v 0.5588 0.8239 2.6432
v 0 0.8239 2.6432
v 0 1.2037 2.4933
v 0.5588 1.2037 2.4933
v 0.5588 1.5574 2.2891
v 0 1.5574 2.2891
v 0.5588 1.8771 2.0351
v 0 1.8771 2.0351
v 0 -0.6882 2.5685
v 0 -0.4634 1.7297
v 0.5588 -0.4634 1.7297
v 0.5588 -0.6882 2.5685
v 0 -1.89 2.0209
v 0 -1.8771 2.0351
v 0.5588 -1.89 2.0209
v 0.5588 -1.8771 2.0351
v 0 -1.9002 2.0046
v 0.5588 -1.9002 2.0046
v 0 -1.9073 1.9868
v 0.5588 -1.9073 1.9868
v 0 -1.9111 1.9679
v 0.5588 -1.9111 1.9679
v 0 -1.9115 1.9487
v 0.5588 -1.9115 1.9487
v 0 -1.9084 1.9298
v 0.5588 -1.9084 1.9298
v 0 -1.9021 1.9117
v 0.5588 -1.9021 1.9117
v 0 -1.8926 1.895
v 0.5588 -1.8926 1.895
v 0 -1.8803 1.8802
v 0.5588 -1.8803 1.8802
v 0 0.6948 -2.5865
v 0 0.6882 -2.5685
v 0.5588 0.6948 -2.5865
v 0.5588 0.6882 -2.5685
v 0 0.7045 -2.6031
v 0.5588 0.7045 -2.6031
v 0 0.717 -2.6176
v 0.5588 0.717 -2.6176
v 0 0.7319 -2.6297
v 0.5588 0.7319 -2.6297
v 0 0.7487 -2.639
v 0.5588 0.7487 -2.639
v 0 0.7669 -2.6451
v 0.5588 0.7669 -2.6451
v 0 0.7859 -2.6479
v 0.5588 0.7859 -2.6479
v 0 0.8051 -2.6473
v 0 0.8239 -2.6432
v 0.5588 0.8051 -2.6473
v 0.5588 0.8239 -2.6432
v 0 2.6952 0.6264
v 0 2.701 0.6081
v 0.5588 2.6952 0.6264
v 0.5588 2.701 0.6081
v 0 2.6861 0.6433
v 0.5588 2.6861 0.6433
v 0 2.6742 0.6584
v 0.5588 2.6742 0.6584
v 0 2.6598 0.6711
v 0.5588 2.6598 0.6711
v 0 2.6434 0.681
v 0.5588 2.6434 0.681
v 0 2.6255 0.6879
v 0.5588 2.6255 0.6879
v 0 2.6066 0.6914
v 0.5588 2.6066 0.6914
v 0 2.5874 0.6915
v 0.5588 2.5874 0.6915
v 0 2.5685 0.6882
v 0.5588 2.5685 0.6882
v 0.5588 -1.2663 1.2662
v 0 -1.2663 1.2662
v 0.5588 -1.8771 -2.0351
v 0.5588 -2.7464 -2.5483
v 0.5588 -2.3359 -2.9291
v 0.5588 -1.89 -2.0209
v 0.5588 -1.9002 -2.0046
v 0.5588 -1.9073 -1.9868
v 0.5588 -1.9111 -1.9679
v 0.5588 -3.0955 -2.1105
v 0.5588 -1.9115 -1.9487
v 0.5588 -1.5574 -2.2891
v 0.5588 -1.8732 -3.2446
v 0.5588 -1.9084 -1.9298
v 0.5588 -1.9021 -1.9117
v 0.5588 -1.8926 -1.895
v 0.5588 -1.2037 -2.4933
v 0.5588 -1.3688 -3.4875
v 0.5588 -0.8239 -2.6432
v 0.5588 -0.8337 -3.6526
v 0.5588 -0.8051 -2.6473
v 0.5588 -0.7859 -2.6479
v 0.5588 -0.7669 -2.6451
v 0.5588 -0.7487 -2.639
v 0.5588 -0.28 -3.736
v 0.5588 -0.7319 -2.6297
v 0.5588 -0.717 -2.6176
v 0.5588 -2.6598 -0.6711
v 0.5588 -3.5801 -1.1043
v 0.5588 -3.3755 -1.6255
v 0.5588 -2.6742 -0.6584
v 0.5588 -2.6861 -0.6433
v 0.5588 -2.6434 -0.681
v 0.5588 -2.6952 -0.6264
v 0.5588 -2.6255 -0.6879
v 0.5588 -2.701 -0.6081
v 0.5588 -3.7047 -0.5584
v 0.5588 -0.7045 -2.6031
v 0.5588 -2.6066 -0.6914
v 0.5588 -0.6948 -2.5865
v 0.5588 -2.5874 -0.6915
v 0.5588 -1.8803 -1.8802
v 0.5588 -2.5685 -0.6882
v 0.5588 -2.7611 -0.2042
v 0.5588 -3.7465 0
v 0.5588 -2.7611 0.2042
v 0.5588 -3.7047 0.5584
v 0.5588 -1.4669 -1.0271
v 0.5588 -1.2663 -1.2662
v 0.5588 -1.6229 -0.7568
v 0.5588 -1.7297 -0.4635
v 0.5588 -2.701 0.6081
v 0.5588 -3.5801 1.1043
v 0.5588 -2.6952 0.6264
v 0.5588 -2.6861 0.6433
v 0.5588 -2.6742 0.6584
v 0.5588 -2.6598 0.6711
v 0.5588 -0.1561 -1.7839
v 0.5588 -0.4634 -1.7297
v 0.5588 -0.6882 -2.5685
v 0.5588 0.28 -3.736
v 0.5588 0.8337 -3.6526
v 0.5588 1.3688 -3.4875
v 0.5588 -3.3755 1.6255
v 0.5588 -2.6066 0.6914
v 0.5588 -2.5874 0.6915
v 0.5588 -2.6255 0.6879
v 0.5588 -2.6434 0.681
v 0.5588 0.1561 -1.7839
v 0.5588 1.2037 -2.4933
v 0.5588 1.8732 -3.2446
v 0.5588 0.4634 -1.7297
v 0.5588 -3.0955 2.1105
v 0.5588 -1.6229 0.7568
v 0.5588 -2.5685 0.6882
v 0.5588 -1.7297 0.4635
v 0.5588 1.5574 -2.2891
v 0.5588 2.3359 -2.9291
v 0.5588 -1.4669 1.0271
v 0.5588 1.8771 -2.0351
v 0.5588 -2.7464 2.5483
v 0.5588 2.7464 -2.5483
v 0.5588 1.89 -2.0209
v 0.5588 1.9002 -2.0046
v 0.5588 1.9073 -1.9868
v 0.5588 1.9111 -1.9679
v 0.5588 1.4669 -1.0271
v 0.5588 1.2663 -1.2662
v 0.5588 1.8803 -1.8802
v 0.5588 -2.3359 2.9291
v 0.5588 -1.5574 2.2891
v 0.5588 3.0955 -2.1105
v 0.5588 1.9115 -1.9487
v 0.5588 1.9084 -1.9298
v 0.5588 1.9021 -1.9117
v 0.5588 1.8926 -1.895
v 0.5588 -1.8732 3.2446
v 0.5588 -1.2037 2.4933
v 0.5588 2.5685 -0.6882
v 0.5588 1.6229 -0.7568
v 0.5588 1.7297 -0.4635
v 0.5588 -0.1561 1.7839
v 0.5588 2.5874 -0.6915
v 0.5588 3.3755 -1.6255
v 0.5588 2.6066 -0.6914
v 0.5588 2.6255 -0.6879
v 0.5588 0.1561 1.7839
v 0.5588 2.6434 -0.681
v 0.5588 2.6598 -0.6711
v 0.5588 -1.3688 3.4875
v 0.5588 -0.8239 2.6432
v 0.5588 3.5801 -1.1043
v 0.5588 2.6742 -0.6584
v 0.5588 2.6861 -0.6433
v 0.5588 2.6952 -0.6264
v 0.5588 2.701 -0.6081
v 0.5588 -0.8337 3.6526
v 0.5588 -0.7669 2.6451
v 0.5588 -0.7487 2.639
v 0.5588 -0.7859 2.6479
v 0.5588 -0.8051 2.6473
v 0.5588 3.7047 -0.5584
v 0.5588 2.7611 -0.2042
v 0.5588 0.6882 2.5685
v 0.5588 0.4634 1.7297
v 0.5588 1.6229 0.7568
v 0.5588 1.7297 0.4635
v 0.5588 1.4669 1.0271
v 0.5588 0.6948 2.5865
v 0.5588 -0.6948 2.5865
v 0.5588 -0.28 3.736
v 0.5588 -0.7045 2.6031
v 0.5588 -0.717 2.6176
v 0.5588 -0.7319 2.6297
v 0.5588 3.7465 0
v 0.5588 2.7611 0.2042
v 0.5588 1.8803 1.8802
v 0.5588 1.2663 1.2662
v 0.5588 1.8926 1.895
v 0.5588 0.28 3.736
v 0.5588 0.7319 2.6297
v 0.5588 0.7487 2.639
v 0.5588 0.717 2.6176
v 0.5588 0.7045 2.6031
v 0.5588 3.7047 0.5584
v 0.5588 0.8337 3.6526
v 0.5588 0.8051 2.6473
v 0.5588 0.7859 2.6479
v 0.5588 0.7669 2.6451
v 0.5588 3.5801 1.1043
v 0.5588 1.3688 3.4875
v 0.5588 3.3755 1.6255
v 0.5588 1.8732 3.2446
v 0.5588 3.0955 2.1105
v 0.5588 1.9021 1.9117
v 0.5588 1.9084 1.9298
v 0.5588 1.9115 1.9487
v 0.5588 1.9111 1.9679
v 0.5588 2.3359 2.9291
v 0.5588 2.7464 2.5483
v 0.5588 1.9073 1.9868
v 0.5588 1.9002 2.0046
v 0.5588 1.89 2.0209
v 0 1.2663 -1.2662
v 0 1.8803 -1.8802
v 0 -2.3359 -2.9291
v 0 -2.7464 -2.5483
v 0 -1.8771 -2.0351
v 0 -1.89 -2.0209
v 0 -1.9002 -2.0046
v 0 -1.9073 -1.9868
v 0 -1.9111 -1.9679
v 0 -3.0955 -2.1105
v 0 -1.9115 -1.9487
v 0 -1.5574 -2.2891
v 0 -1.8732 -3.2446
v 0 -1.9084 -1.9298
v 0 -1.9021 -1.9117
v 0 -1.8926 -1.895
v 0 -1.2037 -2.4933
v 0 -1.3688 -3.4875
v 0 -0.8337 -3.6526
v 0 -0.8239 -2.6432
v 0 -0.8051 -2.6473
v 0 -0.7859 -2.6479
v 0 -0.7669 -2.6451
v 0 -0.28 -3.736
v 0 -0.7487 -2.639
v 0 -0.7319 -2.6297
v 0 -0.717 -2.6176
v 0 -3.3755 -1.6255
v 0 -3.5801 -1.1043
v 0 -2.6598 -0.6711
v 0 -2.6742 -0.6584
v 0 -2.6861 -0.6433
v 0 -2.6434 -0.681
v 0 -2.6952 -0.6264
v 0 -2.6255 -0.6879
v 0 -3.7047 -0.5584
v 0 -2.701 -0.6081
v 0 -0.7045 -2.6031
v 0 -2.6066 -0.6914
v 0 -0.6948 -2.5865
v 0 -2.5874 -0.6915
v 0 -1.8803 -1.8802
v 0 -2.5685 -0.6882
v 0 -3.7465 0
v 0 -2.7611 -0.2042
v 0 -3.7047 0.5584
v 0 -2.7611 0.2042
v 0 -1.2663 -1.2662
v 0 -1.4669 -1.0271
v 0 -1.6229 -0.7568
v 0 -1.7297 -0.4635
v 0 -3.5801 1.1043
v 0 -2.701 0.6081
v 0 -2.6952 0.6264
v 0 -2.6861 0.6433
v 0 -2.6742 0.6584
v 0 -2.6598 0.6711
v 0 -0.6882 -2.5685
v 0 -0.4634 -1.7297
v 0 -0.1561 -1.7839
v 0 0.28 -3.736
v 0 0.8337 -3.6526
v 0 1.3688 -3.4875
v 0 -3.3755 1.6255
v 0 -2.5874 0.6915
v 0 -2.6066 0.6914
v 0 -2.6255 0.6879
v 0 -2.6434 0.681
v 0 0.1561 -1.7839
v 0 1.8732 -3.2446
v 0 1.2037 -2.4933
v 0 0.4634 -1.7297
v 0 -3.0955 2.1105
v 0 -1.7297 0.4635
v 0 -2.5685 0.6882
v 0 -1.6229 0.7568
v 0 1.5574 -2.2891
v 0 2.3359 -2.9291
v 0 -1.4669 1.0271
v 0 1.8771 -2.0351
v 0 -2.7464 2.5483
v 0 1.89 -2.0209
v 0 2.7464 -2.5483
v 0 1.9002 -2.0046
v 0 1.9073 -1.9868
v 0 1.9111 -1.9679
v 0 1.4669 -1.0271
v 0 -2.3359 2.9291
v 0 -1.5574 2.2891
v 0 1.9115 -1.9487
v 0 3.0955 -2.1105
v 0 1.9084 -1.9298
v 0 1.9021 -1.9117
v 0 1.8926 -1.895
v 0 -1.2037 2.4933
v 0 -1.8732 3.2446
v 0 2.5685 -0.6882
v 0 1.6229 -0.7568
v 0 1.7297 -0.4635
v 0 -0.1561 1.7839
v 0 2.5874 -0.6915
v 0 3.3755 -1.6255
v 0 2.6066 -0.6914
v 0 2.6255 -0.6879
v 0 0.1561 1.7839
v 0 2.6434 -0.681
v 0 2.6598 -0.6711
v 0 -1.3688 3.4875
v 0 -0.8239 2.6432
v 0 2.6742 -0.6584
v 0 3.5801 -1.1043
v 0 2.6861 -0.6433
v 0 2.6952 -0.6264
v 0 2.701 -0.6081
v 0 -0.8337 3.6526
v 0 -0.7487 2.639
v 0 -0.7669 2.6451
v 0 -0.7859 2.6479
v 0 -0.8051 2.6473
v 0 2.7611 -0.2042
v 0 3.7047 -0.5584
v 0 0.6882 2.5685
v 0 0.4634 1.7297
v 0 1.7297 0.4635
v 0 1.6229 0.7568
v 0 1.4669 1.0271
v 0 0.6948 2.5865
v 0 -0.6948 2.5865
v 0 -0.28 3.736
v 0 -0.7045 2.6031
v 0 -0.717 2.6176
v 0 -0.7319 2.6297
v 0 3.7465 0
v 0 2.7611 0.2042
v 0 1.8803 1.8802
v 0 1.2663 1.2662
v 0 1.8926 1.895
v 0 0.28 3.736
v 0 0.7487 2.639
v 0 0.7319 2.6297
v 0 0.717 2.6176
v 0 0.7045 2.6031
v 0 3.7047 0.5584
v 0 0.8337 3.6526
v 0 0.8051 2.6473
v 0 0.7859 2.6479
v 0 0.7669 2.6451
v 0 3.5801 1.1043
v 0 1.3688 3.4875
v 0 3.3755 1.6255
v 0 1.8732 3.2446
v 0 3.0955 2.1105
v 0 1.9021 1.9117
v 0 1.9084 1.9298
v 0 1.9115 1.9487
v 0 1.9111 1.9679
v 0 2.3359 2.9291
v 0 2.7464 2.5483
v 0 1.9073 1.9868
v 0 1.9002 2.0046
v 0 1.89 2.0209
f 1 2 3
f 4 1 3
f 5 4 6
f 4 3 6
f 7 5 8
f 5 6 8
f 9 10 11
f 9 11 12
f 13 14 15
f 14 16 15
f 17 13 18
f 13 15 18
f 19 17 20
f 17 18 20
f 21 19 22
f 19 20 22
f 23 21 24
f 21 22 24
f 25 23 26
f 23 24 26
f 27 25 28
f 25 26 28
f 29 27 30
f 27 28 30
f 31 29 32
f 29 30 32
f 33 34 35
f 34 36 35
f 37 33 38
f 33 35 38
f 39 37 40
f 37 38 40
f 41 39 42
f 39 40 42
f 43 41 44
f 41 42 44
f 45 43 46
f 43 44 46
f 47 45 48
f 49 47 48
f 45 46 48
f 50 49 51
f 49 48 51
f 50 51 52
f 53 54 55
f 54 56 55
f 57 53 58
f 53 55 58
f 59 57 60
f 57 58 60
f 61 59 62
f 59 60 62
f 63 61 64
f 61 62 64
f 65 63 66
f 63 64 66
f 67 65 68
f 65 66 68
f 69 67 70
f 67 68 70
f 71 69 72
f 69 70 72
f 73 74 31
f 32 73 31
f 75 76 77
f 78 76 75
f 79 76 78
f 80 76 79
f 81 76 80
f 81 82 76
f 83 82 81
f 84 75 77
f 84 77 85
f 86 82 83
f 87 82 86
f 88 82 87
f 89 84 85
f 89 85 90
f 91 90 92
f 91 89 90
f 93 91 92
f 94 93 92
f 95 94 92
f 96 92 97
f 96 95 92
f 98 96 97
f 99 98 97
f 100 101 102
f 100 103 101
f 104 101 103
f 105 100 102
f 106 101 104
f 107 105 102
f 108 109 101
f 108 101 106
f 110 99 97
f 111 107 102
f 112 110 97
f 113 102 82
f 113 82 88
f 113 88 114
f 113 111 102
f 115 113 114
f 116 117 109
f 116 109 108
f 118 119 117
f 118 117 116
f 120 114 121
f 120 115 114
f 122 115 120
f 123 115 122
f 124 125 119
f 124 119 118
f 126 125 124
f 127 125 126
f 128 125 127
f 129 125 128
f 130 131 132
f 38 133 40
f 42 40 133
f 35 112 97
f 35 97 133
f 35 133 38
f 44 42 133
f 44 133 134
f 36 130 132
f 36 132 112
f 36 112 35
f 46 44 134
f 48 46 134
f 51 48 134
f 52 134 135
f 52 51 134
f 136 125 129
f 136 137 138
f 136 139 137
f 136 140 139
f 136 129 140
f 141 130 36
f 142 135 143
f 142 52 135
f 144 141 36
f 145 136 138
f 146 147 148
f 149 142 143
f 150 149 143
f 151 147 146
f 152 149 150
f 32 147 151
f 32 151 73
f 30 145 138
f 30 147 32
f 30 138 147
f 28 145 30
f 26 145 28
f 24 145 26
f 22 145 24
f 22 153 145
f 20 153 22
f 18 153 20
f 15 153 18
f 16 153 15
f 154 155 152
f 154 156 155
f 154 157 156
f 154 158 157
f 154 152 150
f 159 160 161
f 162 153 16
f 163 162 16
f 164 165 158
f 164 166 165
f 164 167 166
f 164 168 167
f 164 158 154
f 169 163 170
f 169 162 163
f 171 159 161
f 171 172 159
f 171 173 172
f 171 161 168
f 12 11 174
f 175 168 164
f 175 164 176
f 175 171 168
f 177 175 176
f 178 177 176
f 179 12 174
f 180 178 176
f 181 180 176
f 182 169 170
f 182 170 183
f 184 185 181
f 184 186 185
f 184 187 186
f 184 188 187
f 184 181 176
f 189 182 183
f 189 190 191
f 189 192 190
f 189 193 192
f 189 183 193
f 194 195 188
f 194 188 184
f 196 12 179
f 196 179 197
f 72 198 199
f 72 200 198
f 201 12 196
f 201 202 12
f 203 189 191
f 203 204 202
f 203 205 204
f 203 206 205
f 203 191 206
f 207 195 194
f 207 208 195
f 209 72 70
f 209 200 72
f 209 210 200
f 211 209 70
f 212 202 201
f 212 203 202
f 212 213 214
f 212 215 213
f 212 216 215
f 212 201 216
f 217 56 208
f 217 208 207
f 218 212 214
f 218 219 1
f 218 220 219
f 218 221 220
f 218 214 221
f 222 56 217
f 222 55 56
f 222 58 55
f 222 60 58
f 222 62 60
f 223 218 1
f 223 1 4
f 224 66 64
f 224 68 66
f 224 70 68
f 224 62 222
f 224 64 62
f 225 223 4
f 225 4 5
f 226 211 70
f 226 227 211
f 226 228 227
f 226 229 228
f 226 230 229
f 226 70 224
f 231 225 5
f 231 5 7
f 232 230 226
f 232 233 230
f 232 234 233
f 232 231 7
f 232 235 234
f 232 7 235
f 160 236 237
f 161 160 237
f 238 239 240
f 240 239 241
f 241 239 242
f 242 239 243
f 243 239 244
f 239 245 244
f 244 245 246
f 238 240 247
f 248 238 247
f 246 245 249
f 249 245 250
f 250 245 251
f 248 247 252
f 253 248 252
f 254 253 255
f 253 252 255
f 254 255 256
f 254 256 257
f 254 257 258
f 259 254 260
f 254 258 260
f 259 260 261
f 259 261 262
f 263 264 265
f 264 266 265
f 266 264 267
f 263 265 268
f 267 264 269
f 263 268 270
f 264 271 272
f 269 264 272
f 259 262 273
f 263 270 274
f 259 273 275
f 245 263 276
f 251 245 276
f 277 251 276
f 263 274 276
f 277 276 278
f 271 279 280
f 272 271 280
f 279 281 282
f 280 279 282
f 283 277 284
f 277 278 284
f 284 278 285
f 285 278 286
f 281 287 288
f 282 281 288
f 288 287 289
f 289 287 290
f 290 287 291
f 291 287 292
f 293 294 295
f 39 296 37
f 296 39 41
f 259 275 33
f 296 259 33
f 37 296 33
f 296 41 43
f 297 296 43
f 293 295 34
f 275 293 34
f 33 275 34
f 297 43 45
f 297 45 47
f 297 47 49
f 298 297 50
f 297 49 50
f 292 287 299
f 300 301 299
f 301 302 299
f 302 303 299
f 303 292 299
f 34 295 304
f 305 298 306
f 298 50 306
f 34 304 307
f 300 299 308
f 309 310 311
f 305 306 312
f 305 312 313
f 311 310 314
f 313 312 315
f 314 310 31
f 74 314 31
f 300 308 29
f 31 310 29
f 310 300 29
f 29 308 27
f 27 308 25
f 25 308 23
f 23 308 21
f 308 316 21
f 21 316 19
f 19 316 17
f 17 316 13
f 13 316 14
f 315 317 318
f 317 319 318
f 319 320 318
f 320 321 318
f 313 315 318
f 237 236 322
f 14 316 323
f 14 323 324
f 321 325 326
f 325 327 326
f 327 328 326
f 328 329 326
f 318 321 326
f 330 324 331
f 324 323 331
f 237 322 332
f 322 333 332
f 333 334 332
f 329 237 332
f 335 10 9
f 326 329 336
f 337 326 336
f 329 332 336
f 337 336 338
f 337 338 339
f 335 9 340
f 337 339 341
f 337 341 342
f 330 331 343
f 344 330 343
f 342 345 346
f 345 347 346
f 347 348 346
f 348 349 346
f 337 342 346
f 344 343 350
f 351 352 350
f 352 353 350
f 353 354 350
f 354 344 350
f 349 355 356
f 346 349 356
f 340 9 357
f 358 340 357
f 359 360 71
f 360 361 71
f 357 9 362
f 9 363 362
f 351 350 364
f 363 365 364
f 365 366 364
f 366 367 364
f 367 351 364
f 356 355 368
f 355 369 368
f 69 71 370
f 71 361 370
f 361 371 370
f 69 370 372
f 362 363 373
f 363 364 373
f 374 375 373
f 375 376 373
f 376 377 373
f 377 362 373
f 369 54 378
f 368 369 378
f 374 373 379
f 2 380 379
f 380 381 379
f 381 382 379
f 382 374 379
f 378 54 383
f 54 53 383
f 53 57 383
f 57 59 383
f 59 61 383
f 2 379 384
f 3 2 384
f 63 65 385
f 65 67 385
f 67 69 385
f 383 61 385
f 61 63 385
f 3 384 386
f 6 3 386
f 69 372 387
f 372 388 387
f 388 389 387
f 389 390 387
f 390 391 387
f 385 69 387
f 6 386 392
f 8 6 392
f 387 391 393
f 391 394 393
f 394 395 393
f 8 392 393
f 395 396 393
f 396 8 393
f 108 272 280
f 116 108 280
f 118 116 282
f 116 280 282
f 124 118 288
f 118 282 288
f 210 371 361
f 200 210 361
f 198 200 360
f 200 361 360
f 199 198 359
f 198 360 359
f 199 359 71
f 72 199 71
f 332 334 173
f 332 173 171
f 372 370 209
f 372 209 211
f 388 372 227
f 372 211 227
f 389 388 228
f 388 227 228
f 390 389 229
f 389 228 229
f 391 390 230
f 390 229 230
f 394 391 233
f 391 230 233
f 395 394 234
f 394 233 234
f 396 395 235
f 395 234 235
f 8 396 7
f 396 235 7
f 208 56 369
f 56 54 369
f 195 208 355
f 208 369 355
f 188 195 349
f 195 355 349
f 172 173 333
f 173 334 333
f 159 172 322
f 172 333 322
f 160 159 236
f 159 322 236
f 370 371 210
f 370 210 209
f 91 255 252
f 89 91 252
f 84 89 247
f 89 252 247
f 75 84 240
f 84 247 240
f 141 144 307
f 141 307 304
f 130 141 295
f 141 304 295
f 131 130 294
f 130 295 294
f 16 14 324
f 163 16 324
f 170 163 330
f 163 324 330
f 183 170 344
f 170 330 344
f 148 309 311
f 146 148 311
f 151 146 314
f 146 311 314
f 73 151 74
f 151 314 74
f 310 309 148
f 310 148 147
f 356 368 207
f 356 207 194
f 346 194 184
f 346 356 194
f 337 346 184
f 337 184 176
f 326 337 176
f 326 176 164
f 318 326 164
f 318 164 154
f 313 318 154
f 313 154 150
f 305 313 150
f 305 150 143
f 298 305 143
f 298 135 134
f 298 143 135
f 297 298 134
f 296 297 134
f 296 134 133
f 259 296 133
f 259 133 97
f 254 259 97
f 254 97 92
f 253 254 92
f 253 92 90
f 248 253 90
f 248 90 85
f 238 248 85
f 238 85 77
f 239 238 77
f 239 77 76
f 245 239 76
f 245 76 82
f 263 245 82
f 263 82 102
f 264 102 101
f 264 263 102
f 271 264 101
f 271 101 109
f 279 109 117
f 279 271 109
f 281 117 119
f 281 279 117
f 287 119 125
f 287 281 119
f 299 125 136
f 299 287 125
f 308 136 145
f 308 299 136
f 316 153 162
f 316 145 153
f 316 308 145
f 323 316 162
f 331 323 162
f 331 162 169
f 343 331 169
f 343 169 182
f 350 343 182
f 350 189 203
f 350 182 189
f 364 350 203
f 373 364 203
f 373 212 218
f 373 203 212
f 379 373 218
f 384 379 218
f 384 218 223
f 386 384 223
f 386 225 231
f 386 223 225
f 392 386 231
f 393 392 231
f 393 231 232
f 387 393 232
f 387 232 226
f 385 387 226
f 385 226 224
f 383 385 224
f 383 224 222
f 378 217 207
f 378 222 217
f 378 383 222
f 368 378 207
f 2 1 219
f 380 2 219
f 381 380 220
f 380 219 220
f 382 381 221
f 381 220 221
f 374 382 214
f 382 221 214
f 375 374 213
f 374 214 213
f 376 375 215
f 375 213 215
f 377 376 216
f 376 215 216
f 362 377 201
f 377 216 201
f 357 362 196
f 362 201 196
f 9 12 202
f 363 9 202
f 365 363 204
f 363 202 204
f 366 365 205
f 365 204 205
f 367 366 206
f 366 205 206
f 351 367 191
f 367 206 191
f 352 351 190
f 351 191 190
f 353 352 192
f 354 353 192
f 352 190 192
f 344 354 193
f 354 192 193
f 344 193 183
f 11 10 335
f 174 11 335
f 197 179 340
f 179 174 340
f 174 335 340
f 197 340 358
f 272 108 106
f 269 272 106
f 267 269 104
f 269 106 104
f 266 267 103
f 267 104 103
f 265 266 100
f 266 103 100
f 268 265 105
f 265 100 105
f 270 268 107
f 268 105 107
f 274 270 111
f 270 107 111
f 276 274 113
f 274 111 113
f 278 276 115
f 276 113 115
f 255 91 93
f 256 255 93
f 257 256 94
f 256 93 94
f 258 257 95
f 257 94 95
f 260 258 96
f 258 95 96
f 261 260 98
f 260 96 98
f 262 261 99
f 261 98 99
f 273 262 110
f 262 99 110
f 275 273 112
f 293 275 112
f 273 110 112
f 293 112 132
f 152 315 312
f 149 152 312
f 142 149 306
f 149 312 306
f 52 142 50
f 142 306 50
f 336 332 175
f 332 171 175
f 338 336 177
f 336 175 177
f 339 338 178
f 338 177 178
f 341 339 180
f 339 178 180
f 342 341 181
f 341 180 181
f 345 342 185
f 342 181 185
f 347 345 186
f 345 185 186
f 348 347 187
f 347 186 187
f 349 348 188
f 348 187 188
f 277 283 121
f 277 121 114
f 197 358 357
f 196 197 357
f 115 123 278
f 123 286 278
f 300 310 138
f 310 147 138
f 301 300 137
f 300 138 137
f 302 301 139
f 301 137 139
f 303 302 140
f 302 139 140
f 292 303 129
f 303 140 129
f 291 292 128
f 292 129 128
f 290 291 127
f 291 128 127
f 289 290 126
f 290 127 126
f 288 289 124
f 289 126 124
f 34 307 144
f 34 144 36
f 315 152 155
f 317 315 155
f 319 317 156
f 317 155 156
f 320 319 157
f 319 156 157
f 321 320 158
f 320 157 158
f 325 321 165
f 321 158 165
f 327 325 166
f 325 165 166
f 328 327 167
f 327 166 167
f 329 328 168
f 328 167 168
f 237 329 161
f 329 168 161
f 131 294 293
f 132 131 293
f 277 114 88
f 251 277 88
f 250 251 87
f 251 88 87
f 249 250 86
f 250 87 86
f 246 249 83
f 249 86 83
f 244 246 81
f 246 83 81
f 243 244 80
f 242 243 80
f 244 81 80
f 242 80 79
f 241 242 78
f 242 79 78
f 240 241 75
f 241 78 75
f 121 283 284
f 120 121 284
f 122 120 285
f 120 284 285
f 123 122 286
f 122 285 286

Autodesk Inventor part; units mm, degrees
ref_plane "YZ Plane" through (0, 0, 0) normal (1, 0, 0) x (0, 1, 0)
ref_plane "XZ Plane" through (0, 0, 0) normal (0, 1, 0) x (-1, 0, 0)
sketch "Sketch1" plane through (0, 0, 0) normal (1, 0, 0) x (0, 1, 0)
  circle A0 centre (0, 0) radius 3.7465
  circle A1 centre (0, 0) radius 1.7907
  dimension "d0" = 7.493
  dimension "d1" = 3.5814
extrude "Body" add sketch "Sketch1" along normal blind 0.5588
sketch "Sketch2" plane through (0, 0, 0) normal (-1, 0, 0) x (0, 0, 1)
  circle A0 centre (0, 0) radius 1.7907 projected
  circle A1 centre (0, 0) radius 3.7465 projected
  arc A2 (0.7166, 2.6743) -> (-0.7166, 2.6743) centre (0, 0) ccw
  line L0 (-0.4635, 1.7297) -> (-0.7166, 2.6743)
  line L1 (0, 0) -> (0, 2.7686) construction
  line L2 (0.4635, 1.7297) -> (0.7166, 2.6743)
  line L3 (-0.4635, 1.7297) -> (0, 0) construction
  line L4 (0.4635, 1.7297) -> (0, 0) construction
  dimension "d4" = 5.5372
  dimension "d5" = 15
extrude "Cut" cut sketch "Sketch2" against normal blind 0.5588 contours A0 L0 A2 L2
fillet "Fillet1" radius 0.1074 2 edges at (0.2794, 2.6743, 0.7166) (0.2794, 2.6743, -0.7166)
pattern_circular "Cuts" count 6 over 360 about axis through (-10, 0, 0) along (1, 0, 0) of "Cut", "Fillet1"
ref_plane "Work Plane1" through (0, 0, 0) normal (0, 1, 0) x (1, 0, 0)
equation "\"d0\" = SD2"
equation "\"d1\" = SD1"
equation "\"d2\" = SD"
equation "\"d4\" = 0.5 * SD2 + 0.5 * SD1"
equation "\"d6\" = SD"
equation "\"d8\" = 0.03 * SD1"
equation "\"SD1\" = 3.5814"
equation "\"SD2\" = 7.493"
equation "\"SD\" = 0.5588"
equation "\"NND\" = 3.5052"
properties part number "ASME B18.21.1 - No. 6. Carbon Steel" material "Steel, Mild"
